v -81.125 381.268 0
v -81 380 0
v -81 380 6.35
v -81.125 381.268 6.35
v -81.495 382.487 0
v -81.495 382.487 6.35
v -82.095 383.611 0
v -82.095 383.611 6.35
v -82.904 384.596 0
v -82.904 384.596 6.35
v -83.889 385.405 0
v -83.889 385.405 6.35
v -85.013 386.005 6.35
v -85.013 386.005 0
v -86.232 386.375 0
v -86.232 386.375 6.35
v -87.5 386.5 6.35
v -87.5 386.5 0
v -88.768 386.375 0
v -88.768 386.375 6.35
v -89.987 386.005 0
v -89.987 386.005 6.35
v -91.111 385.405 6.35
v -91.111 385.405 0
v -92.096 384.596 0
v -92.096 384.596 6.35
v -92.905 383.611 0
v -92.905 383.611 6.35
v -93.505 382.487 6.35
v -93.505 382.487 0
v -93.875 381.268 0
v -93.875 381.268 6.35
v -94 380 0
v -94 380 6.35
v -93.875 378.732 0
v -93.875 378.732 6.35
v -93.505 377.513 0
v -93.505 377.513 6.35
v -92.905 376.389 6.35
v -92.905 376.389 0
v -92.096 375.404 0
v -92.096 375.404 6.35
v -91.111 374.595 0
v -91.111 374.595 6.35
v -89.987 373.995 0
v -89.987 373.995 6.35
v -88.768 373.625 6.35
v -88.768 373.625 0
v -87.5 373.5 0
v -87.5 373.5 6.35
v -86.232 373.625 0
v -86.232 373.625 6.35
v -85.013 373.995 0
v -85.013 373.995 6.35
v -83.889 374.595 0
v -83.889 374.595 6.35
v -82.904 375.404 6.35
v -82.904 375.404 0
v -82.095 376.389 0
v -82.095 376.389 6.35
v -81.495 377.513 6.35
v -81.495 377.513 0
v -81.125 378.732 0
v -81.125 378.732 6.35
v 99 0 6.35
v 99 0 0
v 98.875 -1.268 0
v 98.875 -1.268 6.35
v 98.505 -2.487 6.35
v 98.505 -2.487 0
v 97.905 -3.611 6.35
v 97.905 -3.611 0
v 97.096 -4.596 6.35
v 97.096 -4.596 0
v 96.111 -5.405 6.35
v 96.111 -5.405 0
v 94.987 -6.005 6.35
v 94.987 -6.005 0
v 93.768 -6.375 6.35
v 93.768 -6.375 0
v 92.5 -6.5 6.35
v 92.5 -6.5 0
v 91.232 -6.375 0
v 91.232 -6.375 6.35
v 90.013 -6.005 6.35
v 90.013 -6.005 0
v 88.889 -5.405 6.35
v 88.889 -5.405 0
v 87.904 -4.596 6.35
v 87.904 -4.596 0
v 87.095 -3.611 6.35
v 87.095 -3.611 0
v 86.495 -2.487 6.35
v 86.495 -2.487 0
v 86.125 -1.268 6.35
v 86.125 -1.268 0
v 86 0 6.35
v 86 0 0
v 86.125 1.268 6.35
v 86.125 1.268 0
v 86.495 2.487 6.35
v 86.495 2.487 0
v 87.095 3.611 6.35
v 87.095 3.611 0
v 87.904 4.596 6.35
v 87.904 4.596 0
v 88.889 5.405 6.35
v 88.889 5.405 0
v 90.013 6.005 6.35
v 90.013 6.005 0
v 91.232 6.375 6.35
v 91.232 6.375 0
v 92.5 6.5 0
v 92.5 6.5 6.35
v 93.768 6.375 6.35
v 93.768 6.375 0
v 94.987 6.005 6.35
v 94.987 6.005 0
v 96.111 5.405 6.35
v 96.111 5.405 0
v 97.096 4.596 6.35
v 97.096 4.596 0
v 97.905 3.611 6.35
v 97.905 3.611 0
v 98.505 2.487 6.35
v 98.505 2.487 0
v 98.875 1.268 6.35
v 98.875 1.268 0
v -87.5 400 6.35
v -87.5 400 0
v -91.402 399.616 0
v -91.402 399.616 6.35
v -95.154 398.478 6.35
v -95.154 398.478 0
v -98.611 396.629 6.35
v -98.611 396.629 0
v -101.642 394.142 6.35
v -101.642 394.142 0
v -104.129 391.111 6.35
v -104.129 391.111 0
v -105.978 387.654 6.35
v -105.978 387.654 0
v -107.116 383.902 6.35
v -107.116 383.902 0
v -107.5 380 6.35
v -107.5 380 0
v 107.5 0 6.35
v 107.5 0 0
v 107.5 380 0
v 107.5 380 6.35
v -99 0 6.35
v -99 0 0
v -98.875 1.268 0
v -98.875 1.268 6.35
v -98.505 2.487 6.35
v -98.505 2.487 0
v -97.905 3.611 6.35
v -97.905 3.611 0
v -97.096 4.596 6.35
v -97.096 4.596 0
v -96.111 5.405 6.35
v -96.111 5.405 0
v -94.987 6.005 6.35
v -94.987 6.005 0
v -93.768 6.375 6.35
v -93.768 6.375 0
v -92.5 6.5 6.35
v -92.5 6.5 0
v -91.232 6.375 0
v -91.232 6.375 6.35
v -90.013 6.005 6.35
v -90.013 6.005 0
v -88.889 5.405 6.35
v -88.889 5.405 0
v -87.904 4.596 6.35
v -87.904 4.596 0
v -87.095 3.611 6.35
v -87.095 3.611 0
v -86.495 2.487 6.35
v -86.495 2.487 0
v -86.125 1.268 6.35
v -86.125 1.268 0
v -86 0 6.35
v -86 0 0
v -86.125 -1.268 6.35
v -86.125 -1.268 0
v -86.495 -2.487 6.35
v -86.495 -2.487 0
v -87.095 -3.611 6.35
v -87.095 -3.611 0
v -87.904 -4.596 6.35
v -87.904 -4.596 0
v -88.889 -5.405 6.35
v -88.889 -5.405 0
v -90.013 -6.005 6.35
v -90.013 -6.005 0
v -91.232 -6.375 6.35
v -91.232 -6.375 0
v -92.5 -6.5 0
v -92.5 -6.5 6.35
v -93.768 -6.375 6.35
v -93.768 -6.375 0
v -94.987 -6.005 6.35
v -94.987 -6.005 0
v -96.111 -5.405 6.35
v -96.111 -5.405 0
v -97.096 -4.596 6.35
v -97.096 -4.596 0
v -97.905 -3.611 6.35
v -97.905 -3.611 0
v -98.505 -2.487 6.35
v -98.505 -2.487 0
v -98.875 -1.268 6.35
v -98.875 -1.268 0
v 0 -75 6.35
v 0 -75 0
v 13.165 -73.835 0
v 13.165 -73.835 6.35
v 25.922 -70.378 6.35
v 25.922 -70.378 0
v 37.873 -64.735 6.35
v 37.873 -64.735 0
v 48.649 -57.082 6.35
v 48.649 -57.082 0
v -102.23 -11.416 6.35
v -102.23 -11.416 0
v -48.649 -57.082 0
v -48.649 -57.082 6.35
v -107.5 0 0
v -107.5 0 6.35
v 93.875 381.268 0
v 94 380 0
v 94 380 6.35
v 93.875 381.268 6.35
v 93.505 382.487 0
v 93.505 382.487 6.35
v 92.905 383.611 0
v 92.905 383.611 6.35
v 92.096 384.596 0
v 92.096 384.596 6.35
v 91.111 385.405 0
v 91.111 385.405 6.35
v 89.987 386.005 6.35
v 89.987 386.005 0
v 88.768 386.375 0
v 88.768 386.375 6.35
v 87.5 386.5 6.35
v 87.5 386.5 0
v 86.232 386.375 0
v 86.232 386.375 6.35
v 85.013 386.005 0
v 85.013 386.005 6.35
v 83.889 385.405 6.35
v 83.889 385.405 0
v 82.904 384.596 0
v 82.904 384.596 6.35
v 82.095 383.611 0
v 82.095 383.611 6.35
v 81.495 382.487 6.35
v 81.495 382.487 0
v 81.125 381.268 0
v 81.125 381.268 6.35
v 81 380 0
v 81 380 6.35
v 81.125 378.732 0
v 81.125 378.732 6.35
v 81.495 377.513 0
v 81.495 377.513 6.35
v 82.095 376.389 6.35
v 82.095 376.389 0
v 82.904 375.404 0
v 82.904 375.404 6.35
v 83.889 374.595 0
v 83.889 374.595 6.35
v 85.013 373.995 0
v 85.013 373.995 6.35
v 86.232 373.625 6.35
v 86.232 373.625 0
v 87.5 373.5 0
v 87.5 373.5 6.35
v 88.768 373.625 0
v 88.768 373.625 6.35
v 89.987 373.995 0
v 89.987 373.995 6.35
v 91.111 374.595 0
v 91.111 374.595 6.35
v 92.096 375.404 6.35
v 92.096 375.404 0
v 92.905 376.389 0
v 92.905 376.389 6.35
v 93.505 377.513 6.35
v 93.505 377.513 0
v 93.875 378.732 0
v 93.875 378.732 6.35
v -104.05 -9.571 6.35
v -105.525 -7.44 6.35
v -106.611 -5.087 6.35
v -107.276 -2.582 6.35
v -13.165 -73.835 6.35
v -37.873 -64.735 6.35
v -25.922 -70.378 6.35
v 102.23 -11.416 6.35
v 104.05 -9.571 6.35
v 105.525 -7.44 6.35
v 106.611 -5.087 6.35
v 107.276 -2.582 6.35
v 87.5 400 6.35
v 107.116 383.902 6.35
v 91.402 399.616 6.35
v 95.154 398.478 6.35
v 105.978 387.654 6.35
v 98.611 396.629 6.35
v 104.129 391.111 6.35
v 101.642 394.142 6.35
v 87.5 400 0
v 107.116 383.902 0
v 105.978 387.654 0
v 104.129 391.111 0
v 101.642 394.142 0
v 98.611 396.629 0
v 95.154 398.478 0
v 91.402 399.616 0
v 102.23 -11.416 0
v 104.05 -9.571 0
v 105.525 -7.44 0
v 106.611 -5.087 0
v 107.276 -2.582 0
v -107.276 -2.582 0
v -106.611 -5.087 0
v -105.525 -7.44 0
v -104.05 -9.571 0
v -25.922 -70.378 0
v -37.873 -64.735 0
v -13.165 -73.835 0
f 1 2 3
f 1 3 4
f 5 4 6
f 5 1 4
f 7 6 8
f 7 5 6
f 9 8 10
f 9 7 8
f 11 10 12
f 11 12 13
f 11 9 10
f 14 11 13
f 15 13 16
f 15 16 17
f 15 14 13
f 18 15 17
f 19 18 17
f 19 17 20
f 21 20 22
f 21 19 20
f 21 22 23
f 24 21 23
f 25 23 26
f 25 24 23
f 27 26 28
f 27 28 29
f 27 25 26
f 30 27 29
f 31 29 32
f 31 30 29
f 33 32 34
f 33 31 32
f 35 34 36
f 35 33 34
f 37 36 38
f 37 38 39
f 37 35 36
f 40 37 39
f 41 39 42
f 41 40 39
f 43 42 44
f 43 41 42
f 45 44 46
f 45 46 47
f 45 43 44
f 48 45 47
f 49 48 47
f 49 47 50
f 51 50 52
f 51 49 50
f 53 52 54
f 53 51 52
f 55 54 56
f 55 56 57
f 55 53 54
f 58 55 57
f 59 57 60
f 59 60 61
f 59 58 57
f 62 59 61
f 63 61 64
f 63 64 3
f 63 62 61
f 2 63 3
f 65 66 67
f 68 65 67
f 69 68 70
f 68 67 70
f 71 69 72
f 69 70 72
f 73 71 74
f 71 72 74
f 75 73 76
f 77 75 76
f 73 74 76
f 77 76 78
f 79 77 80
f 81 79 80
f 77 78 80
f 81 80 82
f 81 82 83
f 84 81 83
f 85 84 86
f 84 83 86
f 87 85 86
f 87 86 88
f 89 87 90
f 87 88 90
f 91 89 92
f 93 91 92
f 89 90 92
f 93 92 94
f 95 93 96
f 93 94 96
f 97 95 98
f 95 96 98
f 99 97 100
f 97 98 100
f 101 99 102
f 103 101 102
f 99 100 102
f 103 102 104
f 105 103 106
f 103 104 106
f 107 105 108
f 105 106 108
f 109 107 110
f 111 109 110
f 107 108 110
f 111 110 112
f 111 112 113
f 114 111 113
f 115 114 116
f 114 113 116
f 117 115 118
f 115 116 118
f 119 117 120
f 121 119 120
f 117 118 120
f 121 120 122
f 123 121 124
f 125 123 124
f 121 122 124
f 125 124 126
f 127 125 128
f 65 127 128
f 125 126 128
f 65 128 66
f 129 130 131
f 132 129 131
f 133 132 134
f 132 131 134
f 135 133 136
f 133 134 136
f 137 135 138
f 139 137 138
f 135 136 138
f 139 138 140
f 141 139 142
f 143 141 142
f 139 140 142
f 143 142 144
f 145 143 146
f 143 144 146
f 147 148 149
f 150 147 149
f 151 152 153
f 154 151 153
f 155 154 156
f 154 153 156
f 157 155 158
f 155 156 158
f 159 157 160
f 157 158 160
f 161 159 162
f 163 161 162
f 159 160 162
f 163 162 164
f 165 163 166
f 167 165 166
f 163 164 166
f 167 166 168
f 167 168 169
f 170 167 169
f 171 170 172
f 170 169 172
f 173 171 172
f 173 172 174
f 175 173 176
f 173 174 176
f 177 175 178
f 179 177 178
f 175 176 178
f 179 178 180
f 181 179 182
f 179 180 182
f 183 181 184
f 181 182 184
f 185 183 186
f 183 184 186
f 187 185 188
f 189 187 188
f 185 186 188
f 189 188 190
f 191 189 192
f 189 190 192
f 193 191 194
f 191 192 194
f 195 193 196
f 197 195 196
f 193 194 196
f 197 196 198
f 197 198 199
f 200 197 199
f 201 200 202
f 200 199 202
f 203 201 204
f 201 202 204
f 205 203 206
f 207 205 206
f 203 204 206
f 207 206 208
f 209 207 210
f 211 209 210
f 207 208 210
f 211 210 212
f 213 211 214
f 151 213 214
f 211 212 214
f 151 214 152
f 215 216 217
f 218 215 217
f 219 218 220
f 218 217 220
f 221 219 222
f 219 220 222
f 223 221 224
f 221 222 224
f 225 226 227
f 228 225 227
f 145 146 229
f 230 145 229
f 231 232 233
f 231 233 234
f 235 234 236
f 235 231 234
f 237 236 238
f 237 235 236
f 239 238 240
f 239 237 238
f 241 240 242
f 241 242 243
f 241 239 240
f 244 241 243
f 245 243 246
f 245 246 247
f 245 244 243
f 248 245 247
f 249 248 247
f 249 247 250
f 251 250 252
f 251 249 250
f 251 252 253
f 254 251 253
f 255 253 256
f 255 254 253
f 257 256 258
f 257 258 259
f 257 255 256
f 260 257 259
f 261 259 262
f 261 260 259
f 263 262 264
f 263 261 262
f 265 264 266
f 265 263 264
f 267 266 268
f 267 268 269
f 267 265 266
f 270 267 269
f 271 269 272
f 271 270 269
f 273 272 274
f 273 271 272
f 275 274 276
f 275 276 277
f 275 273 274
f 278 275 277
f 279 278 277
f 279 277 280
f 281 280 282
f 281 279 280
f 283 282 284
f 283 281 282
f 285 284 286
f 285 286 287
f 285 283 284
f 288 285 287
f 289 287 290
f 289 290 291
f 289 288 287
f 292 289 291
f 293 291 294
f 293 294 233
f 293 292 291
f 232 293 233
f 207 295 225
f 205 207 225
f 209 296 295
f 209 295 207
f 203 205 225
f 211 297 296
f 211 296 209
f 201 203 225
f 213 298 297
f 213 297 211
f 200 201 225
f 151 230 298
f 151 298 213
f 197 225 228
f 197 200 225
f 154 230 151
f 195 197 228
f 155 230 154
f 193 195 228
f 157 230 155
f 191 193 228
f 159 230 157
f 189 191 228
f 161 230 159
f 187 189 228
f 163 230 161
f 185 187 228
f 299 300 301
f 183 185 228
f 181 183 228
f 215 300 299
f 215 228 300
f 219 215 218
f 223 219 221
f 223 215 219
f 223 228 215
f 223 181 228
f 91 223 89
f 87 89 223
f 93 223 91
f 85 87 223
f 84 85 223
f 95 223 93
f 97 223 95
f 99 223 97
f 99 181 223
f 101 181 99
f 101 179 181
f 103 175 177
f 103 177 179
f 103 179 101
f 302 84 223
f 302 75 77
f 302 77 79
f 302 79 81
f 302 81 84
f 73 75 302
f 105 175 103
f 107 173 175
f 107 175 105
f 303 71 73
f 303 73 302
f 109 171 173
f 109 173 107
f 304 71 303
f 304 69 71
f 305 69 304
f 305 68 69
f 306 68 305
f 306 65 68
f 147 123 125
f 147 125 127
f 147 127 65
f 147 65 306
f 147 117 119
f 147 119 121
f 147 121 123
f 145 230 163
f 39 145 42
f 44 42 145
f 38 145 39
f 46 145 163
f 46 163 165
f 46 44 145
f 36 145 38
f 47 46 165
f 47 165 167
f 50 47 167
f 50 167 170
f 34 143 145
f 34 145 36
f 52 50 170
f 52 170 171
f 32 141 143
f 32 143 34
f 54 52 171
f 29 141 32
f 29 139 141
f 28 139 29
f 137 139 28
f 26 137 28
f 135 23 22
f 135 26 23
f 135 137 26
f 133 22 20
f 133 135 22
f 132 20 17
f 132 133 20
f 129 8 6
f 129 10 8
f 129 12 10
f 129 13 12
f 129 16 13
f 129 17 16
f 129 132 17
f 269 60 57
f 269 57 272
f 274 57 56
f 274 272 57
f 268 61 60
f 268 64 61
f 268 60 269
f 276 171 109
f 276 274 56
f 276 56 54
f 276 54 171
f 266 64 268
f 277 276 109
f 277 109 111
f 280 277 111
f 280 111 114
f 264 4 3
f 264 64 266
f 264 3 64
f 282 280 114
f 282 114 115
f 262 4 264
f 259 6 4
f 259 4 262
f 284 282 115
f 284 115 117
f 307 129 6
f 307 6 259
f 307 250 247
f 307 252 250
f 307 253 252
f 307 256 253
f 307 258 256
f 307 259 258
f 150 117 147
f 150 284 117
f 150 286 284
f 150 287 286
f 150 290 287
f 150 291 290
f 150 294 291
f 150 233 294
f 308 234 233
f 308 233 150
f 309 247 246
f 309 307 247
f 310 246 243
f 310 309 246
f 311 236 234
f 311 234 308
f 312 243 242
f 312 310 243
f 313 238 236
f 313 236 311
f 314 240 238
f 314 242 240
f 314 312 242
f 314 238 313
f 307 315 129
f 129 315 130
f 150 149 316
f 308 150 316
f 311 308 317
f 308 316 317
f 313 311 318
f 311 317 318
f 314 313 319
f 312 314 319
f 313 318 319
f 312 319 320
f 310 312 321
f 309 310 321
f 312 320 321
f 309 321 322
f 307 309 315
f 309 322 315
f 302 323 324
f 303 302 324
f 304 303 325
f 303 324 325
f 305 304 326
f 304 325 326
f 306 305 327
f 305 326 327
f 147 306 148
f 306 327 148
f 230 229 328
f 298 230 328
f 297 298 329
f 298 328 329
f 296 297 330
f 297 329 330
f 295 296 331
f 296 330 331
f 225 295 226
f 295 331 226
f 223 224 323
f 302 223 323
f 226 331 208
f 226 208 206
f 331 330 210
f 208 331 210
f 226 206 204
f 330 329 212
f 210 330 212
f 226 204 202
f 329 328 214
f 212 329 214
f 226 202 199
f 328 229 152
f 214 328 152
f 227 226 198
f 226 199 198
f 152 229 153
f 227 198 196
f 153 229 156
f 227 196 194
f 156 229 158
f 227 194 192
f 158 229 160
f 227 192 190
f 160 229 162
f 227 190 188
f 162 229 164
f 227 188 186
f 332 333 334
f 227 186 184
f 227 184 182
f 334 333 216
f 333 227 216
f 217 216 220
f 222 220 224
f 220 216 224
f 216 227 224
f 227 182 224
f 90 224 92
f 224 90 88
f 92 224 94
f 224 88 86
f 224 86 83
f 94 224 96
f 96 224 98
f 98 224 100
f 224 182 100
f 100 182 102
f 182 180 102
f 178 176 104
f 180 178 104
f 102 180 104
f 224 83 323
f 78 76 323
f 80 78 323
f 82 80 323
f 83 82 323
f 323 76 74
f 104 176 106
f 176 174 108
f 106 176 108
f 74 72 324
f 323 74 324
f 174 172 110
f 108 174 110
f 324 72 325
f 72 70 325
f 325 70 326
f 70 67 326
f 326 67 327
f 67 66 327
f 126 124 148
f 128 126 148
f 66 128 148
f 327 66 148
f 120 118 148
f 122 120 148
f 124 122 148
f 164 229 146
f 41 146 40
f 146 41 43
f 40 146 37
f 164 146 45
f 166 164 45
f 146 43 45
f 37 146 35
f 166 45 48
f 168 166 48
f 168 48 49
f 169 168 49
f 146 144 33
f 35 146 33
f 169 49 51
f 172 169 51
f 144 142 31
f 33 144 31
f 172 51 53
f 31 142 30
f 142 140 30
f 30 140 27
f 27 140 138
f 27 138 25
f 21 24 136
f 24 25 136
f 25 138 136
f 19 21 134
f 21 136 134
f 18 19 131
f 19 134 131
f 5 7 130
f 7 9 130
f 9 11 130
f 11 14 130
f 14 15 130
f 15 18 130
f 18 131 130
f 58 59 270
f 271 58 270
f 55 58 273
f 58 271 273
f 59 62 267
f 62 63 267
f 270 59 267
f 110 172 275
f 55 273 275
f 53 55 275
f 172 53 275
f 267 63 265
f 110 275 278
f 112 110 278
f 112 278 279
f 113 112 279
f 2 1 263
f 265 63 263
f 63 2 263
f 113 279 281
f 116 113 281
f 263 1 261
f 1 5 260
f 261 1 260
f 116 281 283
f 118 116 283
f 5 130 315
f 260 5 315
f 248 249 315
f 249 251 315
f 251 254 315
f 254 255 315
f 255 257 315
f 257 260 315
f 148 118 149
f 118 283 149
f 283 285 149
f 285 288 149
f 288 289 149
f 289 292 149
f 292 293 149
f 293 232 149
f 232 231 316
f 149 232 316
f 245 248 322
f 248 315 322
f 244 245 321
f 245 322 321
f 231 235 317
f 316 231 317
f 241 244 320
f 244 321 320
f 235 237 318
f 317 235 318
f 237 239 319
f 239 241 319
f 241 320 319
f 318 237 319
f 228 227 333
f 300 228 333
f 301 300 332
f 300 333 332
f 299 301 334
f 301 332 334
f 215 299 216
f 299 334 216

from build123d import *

# Parameters (mm, degrees)
F0_R     = 6.5
F1_DEPTH = 6.35


# Not quite as in the source:
# - a length typed as a fraction of an inch, garbled in the dataset ("3 / 203.2 mm" for 3/8 in), is restored


with BuildPart() as f1:
    # F0 (on Top) → F1 (new body)
    with BuildSketch(Plane.XY):
        with BuildLine():
            Line((0, -75), (0, 0))
            Line((0, 0), (-75, 0))
            ThreePointArc((-75, 0), (-68.0942312118, -31.4352616607), (-48.6486486486, -57.0815993527))
            ThreePointArc((-48.6486486486, -57.0815993527), (-25.9218059609, -70.3779793382), (0, -75))
        make_face()
        with BuildLine():
            ThreePointArc((-48.6486486486, -57.0815993527), (-68.0942312118, -31.4352616607), (-75, 0))
            Line((-75, 0), (-77.5, 0))
            ThreePointArc((-77.5, 0), (-86.2129476679, -13.6188462424), (-102.2297297297, -11.4163198705))
            Line((-102.2297297297, -11.4163198705), (-48.6486486486, -57.0815993527))
        make_face()
        with BuildLine():
            Line((-86, 0), (-77.5, 0))
            ThreePointArc((-77.5, 0), (-86.2129476679, 13.6188462424), (-102.2297297297, 11.4163198705))
            ThreePointArc((-102.2297297297, 11.4163198705), (-106.1188462424, 6.2870523321), (-107.5, 0))
            Line((-107.5, 0), (-99, 0))
            ThreePointArc((-99, 0), (-92.5, 6.5), (-86, 0))
        make_face()
        with BuildLine():
            ThreePointArc((48.6486486486, -57.0815993527), (68.0942312118, -31.4352616607), (75, 0))
            Line((75, 0), (0, 0))
            Line((0, 0), (0, -75))
            ThreePointArc((0, -75), (25.9218059609, -70.3779793382), (48.6486486486, -57.0815993527))
        make_face()
        with BuildLine():
            ThreePointArc((-102.2297297297, -11.4163198705), (-86.2129476679, -13.6188462424), (-77.5, 0))
            Line((-77.5, 0), (-86, 0))
            ThreePointArc((-86, 0), (-92.5, -6.5), (-99, 0))
            Line((-99, 0), (-107.5, 0))
            ThreePointArc((-107.5, 0), (-106.1188462424, -6.2870523321), (-102.2297297297, -11.4163198705))
        make_face()
        with BuildLine():
            ThreePointArc((0, 75), (25.9218059609, 70.3779793382), (48.6486486486, 57.0815993527))
            Line((48.6486486486, 57.0815993527), (102.2297297297, 11.4163198705))
            ThreePointArc((102.2297297297, 11.4163198705), (106.1188462424, 6.2870523321), (107.5, 0))
            Line((107.5, 0), (107.5, 75))
            Line((107.5, 75), (0, 75))
        make_face()
        with BuildLine():
            ThreePointArc((-48.6486486486, 57.0815993527), (-25.9218059609, 70.3779793382), (0, 75))
            Line((0, 75), (107.5, 75))
            Line((107.5, 75), (107.5, 380))
            ThreePointArc((107.5, 380), (101.6421356237, 394.1421356237), (87.5, 400))
            Line((87.5, 400), (-87.5, 400))
            ThreePointArc((-87.5, 400), (-101.6421356237, 394.1421356237), (-107.5, 380))
            Line((-107.5, 380), (-107.5, 0))
            ThreePointArc((-107.5, 0), (-106.1188462424, 6.2870523321), (-102.2297297297, 11.4163198705))
            Line((-102.2297297297, 11.4163198705), (-48.6486486486, 57.0815993527))
        make_face()
        with Locations((-87.5, 380)):
            Circle(F0_R, mode=Mode.SUBTRACT)
        with Locations((87.5, 380)):
            Circle(F0_R, mode=Mode.SUBTRACT)
        with BuildLine():
            Line((86, 0), (77.5, 0))
            ThreePointArc((77.5, 0), (86.2129476679, -13.6188462424), (102.2297297297, -11.4163198705))
            ThreePointArc((102.2297297297, -11.4163198705), (106.1188462424, -6.2870523321), (107.5, 0))
            Line((107.5, 0), (99, 0))
            ThreePointArc((99, 0), (92.5, -6.5), (86, 0))
        make_face()
        with BuildLine():
            ThreePointArc((102.2297297297, 11.4163198705), (86.2129476679, 13.6188462424), (77.5, 0))
            Line((77.5, 0), (86, 0))
            ThreePointArc((86, 0), (92.5, 6.5), (99, 0))
            Line((99, 0), (107.5, 0))
            ThreePointArc((107.5, 0), (106.1188462424, 6.2870523321), (102.2297297297, 11.4163198705))
        make_face()
        with BuildLine():
            ThreePointArc((48.6486486486, 57.0815993527), (68.0942312118, 31.4352616607), (75, 0))
            Line((75, 0), (77.5, 0))
            ThreePointArc((77.5, 0), (86.2129476679, 13.6188462424), (102.2297297297, 11.4163198705))
            Line((102.2297297297, 11.4163198705), (48.6486486486, 57.0815993527))
        make_face()
        with BuildLine():
            Line((77.5, 0), (75, 0))
            ThreePointArc((75, 0), (68.0942312118, -31.4352616607), (48.6486486486, -57.0815993527))
            Line((48.6486486486, -57.0815993527), (102.2297297297, -11.4163198705))
            ThreePointArc((102.2297297297, -11.4163198705), (86.2129476679, -13.6188462424), (77.5, 0))
        make_face()
        with BuildLine():
            Line((0, 0), (75, 0))
            ThreePointArc((75, 0), (68.0942312118, 31.4352616607), (48.6486486486, 57.0815993527))
            ThreePointArc((48.6486486486, 57.0815993527), (25.9218059609, 70.3779793382), (0, 75))
            Line((0, 75), (0, 0))
        make_face()
        with BuildLine():
            Line((-77.5, 0), (-75, 0))
            ThreePointArc((-75, 0), (-68.0942312118, 31.4352616607), (-48.6486486486, 57.0815993527))
            Line((-48.6486486486, 57.0815993527), (-102.2297297297, 11.4163198705))
            ThreePointArc((-102.2297297297, 11.4163198705), (-86.2129476679, 13.6188462424), (-77.5, 0))
        make_face()
        with BuildLine():
            Line((-75, 0), (0, 0))
            Line((0, 0), (0, 75))
            ThreePointArc((0, 75), (-25.9218059609, 70.3779793382), (-48.6486486486, 57.0815993527))
            ThreePointArc((-48.6486486486, 57.0815993527), (-68.0942312118, 31.4352616607), (-75, 0))
        make_face()
    extrude(amount=F1_DEPTH)


solid = f1.part
